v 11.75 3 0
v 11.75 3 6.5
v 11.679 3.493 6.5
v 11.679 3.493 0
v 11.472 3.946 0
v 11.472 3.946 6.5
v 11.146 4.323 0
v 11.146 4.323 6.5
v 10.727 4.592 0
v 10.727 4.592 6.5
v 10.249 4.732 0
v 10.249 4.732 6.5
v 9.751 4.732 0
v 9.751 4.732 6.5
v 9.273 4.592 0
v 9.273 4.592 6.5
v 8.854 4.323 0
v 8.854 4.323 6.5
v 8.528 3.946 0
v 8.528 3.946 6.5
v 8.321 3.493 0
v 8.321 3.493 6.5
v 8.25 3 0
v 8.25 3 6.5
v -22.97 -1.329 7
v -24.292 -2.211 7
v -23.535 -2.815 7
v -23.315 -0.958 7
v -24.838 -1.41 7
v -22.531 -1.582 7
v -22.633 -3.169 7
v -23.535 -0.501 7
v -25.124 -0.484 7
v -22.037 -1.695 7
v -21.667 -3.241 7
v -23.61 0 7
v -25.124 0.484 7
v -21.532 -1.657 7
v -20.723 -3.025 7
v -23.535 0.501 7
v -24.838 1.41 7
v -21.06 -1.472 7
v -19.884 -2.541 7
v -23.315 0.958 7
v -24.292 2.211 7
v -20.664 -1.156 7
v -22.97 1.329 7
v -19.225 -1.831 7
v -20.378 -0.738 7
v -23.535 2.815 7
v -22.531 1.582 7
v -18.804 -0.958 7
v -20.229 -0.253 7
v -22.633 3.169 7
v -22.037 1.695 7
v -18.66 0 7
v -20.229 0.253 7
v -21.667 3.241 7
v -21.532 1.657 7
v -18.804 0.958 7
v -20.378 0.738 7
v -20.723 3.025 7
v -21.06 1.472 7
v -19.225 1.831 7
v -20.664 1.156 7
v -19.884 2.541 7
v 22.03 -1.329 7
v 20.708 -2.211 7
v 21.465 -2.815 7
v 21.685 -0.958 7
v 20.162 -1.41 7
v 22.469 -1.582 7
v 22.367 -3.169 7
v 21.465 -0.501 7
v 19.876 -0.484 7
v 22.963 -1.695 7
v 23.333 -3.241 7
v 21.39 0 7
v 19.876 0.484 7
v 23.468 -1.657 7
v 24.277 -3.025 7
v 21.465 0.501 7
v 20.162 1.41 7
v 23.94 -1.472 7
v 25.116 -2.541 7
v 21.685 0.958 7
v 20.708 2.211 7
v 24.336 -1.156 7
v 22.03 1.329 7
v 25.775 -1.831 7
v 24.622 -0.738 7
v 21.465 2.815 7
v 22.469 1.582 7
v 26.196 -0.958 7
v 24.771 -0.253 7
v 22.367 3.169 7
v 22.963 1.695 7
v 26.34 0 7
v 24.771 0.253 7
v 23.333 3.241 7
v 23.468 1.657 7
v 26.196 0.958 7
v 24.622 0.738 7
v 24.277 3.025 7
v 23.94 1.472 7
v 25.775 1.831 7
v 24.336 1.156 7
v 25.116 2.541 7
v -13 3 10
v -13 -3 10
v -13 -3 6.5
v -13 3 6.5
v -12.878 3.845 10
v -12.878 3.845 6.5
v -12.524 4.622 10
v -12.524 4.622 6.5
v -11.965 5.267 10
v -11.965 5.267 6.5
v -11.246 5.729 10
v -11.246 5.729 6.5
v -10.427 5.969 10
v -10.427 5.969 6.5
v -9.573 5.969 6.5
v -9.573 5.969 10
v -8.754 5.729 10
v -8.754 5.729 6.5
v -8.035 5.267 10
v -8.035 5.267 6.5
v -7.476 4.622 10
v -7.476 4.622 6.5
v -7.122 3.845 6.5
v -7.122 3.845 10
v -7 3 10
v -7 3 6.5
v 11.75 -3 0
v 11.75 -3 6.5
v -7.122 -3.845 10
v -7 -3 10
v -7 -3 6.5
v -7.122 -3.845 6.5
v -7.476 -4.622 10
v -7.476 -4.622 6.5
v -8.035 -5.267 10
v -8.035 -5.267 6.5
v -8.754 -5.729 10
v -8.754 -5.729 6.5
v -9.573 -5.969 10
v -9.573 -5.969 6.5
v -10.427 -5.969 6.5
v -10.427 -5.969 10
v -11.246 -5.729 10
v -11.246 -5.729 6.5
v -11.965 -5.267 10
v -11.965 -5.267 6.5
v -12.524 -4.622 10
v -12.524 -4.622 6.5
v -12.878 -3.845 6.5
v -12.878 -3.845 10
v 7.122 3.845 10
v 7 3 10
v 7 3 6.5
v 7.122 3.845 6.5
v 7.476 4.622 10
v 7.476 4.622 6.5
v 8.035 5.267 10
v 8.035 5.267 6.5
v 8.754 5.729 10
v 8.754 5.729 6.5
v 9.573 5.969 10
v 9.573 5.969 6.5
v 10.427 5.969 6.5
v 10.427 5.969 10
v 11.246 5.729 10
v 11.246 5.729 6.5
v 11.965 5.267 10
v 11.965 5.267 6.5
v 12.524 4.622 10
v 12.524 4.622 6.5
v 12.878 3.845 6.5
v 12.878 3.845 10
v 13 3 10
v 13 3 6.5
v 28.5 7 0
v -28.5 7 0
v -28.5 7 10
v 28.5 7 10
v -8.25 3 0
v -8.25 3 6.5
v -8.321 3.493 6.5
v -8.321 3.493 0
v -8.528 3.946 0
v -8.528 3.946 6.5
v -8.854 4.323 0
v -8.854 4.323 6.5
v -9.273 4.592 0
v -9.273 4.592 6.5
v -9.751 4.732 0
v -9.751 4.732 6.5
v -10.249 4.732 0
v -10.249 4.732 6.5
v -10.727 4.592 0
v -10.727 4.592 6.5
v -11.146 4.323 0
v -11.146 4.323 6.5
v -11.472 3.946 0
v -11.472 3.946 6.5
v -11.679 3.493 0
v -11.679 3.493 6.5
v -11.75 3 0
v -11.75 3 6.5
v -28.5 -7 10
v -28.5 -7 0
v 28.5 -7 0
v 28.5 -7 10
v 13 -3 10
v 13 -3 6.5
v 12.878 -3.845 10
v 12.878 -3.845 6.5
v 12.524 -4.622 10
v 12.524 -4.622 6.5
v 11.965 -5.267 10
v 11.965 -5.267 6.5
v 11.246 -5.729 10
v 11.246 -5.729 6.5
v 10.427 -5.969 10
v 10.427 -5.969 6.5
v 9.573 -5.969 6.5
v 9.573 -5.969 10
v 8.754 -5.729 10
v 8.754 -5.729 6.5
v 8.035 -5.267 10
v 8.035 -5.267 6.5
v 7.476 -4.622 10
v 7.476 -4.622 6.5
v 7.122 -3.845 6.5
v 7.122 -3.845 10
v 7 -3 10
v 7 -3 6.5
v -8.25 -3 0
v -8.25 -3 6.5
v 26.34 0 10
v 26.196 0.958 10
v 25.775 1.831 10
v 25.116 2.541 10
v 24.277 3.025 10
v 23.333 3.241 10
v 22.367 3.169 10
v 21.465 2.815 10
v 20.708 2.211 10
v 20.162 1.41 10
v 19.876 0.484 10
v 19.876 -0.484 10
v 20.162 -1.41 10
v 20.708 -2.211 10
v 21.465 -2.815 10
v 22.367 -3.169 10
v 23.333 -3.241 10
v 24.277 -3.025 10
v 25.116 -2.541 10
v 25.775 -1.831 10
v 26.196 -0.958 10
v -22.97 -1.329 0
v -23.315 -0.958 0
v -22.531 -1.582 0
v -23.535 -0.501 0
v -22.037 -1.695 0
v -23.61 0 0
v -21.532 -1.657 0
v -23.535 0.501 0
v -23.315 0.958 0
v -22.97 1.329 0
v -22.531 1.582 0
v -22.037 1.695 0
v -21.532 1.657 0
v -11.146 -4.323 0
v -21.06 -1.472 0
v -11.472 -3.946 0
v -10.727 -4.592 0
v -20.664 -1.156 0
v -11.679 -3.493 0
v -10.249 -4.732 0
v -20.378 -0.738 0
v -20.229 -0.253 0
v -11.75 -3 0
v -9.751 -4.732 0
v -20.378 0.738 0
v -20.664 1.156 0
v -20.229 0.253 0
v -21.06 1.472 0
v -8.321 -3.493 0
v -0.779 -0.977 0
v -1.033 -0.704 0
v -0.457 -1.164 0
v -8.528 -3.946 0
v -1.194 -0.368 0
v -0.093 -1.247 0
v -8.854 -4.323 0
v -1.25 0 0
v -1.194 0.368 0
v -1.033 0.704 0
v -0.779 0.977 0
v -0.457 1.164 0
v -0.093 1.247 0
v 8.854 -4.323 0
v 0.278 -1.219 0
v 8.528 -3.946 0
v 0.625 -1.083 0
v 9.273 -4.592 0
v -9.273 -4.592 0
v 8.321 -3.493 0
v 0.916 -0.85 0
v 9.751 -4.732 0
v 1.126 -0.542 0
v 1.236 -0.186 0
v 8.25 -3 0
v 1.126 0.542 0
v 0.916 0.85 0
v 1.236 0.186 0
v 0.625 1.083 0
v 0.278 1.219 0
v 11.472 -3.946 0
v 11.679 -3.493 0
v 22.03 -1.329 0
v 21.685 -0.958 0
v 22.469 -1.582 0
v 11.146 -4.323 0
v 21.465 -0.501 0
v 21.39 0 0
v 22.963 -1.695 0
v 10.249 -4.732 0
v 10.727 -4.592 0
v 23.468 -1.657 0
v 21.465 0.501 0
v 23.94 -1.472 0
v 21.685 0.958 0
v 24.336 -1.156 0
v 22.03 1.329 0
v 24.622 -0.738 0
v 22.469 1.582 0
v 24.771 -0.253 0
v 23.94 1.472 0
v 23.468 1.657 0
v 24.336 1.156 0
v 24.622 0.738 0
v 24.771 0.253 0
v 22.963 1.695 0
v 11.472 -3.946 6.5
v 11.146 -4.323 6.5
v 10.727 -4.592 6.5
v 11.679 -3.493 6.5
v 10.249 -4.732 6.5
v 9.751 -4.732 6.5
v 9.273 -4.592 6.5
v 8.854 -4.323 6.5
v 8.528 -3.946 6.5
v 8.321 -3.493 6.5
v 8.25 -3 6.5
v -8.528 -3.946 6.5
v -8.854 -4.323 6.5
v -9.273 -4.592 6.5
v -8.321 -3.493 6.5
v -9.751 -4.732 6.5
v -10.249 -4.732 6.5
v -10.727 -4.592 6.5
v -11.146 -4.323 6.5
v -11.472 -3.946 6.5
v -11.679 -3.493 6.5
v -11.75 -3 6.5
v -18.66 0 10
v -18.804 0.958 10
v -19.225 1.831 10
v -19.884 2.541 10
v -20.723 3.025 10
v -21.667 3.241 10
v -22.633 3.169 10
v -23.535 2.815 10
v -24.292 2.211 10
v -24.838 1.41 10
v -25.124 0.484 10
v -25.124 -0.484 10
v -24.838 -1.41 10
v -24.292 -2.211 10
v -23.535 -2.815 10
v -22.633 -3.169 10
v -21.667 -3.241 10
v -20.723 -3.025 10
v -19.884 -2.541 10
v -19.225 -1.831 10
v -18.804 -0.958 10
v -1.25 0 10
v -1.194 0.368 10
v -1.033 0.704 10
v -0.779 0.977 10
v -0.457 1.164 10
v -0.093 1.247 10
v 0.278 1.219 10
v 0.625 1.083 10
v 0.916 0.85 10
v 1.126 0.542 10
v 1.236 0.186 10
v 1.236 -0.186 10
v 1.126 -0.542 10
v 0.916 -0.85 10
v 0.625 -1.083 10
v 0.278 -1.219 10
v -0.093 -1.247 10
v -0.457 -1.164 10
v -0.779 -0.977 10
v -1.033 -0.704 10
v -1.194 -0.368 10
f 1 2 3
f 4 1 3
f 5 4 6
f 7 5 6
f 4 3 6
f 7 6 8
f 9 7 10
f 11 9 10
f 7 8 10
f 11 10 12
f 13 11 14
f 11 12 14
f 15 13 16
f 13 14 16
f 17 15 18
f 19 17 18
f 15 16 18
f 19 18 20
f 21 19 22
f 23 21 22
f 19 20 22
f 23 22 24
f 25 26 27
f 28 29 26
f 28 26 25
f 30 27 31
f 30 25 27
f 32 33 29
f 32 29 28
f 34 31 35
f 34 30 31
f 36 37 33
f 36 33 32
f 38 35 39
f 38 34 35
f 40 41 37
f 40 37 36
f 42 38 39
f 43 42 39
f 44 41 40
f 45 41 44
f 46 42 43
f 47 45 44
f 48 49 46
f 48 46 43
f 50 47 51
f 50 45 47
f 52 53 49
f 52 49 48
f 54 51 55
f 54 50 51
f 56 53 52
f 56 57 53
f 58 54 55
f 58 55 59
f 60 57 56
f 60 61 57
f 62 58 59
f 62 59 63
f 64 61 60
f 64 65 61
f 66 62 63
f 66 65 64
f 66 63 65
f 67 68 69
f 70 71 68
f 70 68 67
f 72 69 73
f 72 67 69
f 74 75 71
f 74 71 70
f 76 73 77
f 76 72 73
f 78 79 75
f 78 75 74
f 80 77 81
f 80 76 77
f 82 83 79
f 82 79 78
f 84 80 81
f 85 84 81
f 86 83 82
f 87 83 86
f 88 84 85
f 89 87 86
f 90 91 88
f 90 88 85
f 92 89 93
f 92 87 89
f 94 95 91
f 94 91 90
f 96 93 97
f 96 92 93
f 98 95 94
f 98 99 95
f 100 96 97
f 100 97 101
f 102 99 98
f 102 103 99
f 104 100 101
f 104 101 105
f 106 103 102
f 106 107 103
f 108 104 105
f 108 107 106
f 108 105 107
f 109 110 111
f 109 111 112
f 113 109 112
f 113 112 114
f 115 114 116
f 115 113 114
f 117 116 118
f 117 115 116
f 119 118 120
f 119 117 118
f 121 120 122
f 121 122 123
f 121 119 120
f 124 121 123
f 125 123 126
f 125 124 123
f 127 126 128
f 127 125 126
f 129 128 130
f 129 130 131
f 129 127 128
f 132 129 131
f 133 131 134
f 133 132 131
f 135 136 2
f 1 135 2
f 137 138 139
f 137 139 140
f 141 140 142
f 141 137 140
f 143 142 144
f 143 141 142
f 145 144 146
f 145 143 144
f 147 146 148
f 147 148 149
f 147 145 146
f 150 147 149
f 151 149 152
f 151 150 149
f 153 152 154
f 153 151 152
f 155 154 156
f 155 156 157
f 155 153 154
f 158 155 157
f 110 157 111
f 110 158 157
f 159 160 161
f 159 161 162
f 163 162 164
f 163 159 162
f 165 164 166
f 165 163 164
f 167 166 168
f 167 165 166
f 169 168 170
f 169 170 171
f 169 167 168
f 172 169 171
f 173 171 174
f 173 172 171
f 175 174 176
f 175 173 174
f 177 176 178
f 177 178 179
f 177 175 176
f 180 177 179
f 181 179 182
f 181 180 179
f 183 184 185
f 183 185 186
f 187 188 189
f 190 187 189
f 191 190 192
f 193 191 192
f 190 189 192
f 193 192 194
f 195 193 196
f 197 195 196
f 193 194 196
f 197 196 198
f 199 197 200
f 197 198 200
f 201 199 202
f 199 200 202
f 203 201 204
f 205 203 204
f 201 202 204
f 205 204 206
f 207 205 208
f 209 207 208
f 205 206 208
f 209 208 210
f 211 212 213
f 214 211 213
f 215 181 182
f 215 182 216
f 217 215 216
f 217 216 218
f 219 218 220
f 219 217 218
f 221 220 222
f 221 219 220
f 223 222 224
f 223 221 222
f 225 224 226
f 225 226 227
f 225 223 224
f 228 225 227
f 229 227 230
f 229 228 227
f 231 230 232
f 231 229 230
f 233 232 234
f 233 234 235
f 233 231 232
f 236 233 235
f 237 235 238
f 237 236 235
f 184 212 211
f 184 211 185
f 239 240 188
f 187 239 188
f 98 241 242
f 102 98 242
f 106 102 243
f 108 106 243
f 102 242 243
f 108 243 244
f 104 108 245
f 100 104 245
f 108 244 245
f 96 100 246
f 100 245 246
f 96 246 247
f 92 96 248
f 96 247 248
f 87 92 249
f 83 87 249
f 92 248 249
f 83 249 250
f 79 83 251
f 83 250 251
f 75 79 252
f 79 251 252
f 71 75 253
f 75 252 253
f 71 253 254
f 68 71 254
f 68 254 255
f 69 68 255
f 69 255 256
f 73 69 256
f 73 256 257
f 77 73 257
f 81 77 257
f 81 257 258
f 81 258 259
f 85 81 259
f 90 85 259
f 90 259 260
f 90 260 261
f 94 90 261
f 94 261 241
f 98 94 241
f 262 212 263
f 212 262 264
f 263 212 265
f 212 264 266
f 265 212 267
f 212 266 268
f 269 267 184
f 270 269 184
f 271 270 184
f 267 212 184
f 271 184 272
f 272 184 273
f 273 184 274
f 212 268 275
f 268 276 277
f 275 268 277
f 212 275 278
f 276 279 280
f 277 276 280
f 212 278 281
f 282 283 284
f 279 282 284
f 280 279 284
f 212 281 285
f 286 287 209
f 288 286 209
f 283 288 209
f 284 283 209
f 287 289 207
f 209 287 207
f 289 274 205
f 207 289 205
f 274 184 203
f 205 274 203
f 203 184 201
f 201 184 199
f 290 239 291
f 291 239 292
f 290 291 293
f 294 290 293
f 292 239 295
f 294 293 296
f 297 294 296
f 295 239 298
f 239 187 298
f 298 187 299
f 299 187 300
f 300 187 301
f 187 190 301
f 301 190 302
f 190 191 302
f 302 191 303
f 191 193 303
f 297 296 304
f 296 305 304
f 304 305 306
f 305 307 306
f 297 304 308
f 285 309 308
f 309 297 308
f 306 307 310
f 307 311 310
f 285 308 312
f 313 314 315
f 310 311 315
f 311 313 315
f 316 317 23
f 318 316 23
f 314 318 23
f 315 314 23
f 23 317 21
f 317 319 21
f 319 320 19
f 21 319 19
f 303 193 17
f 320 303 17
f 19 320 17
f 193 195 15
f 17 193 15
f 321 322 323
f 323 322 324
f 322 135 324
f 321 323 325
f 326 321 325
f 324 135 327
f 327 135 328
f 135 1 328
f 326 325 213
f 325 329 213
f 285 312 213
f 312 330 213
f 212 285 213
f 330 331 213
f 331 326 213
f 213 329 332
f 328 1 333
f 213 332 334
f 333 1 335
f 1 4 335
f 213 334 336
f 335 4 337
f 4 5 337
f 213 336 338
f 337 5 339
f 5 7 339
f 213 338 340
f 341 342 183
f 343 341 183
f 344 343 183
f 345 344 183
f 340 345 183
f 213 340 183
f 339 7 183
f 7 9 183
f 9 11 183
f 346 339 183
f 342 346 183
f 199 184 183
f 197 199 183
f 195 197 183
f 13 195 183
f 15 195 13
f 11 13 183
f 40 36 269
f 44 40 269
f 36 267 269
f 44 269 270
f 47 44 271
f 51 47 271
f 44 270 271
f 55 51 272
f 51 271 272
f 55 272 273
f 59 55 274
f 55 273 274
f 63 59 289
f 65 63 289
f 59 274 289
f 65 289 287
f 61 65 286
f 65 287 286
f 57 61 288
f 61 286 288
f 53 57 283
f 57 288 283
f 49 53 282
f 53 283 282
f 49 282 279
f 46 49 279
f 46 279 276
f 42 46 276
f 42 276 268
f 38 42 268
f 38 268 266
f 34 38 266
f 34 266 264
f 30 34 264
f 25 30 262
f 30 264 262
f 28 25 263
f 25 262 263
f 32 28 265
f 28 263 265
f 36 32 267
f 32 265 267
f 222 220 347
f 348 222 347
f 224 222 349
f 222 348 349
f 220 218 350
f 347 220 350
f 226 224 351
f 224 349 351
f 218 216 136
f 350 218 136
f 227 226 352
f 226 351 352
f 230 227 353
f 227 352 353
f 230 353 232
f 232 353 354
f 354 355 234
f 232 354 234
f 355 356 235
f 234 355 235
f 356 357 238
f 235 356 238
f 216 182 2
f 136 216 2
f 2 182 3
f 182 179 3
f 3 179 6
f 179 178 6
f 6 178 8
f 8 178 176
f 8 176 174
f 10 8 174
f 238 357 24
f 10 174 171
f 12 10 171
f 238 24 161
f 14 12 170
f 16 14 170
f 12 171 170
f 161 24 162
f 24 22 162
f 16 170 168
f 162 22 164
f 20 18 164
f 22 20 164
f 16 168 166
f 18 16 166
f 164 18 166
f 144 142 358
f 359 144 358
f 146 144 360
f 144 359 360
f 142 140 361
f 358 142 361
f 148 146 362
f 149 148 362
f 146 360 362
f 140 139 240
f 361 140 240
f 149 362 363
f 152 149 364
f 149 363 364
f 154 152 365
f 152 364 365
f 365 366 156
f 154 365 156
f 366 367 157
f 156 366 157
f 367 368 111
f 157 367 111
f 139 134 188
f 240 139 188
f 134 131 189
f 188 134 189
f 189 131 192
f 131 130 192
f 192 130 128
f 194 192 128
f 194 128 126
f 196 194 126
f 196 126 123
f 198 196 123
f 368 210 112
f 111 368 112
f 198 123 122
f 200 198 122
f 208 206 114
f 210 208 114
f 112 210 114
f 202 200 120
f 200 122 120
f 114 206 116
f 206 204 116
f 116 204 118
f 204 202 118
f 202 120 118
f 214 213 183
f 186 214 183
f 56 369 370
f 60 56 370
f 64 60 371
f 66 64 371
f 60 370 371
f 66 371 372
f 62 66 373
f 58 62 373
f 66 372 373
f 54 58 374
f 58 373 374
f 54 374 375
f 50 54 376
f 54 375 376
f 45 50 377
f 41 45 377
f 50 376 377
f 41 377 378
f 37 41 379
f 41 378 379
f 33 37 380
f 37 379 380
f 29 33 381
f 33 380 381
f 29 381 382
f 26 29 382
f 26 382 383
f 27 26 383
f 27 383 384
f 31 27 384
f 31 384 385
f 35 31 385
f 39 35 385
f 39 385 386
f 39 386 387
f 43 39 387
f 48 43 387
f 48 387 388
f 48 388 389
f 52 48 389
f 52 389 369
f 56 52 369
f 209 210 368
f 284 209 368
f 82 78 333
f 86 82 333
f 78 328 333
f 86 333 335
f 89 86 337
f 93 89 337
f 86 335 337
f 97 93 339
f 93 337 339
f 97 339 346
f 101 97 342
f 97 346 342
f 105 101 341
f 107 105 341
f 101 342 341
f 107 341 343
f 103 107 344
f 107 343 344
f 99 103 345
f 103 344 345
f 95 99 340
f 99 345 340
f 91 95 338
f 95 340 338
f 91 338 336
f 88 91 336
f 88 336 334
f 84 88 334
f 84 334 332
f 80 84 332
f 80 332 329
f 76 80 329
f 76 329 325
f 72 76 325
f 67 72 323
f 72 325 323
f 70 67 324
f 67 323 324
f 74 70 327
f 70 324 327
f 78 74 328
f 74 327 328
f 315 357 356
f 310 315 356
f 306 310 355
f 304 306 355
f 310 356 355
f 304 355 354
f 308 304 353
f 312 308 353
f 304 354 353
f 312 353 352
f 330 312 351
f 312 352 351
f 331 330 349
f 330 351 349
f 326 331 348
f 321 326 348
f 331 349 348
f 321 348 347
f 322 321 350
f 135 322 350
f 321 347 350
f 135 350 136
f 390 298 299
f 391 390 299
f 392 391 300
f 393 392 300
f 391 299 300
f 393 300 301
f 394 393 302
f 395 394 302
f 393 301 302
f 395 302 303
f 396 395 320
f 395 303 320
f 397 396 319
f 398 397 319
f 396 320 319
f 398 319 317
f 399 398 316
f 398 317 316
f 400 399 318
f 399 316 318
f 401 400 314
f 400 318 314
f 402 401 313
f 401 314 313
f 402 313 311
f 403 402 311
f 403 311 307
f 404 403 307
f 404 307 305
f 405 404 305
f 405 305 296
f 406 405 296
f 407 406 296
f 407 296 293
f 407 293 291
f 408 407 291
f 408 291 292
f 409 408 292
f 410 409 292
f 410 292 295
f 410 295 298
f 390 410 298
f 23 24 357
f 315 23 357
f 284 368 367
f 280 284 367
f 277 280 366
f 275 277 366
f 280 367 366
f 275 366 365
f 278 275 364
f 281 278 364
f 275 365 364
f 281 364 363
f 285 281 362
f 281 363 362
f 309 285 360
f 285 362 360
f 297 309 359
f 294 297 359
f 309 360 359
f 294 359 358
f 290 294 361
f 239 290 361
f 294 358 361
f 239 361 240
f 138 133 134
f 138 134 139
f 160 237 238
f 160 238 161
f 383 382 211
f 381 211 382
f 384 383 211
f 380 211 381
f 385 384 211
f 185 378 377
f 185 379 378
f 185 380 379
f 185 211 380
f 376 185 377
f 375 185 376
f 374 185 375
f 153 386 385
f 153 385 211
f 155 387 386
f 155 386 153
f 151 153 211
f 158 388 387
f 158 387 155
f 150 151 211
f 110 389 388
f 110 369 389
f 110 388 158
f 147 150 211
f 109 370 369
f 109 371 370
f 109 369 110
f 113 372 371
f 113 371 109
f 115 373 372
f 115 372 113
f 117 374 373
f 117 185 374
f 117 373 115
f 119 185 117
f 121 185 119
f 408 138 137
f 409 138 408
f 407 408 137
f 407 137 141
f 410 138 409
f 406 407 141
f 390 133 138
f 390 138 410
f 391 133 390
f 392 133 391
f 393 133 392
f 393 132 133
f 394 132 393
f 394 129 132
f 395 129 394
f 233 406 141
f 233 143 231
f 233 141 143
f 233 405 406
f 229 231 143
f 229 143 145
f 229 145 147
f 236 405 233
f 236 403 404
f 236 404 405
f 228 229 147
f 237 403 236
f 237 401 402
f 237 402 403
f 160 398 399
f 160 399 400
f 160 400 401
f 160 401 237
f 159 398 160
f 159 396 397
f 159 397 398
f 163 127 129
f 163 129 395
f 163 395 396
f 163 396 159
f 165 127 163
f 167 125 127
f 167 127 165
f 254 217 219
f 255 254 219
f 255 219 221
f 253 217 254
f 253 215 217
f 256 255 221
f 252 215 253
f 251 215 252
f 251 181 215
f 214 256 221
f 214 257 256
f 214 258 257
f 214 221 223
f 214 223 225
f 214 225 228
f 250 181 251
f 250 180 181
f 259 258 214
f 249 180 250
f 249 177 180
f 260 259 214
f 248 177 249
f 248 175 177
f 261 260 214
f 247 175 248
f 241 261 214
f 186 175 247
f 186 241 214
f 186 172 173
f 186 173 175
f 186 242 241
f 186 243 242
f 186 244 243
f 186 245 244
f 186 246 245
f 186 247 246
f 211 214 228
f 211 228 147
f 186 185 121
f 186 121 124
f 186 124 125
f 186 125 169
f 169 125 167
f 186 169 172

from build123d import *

# Parameters (mm, degrees)
SKETCH1_W                      = 57
SKETCH1_H                      = 14
BOSS_EXTRUDE1_DEPTH            = 10
CUT_EXTRUDE1_DEPTH             = 3.5
CUT_EXTRUDE2_DEPTH             = 7.5
CBORE_FOR_M3_SHCS1_D           = 3.4
CBORE_FOR_M3_SHCS1_CBORE_D     = 6.5
CBORE_FOR_M3_SHCS1_CBORE_DEPTH = 3
LPATTERN1_COUNT                = 2
LPATTERN1_PITCH                = 45
M3X0_5_TAPPED_HOLE1_D          = 2.5


with BuildPart() as part:
    # Sketch1 → Boss-Extrude1 (new body)
    with BuildSketch(Plane.XY):
        Rectangle(SKETCH1_W, SKETCH1_H)
    extrude(amount=BOSS_EXTRUDE1_DEPTH)

    # Sketch2 → Cut-Extrude1 (cut)
    with BuildSketch(Plane.XY.offset(10)):
        with BuildLine():
            Line((-7, 3), (-7, -3))
            ThreePointArc((-7, -3), (-10, -6), (-13, -3))
            Line((-13, -3), (-13, 3))
            ThreePointArc((-13, 3), (-10, 6), (-7, 3))
        make_face()
        with BuildLine():
            Line((13, 3), (13, -3))
            ThreePointArc((13, -3), (10, -6), (7, -3))
            Line((7, -3), (7, 3))
            ThreePointArc((7, 3), (10, 6), (13, 3))
        make_face()
    extrude(amount=-CUT_EXTRUDE1_DEPTH, mode=Mode.SUBTRACT)

    # Sketch3 → Cut-Extrude2 (cut, through all)
    with BuildSketch(Plane.XY.offset(6.5)):
        with BuildLine():
            Line((-11.75, 3), (-11.75, -3))
            ThreePointArc((-11.75, -3), (-10, -4.75), (-8.25, -3))
            Line((-8.25, -3), (-8.25, 3))
            ThreePointArc((-8.25, 3), (-10, 4.75), (-11.75, 3))
        make_face()
        with BuildLine():
            Line((11.75, -3), (11.75, 3))
            ThreePointArc((11.75, 3), (10, 4.75), (8.25, 3))
            Line((8.25, 3), (8.25, -3))
            ThreePointArc((8.25, -3), (10, -4.75), (11.75, -3))
        make_face()
    extrude(amount=-CUT_EXTRUDE2_DEPTH, mode=Mode.SUBTRACT)

    # CBORE for M3 SHCS1 (through all)
    with Locations(Plane.XY.offset(10)):
        with Locations((-21.910027568, 0)):
            cbore_for_m3_shcs1 = CounterBoreHole(CBORE_FOR_M3_SHCS1_D / 2, CBORE_FOR_M3_SHCS1_CBORE_D / 2, CBORE_FOR_M3_SHCS1_CBORE_DEPTH)

    # LPattern1: CBORE for M3 SHCS1 ×2
    with Locations(*[(i * LPATTERN1_PITCH, 0, 0) for i in range(1, LPATTERN1_COUNT)]):
        add(cbore_for_m3_shcs1, mode=Mode.SUBTRACT)

    # M3x0.5 Tapped Hole1 (through all)
    with Locations(Plane.XY.offset(10)):
        with Locations((0, 0)):
            Hole(M3X0_5_TAPPED_HOLE1_D / 2)


solid = part.part
